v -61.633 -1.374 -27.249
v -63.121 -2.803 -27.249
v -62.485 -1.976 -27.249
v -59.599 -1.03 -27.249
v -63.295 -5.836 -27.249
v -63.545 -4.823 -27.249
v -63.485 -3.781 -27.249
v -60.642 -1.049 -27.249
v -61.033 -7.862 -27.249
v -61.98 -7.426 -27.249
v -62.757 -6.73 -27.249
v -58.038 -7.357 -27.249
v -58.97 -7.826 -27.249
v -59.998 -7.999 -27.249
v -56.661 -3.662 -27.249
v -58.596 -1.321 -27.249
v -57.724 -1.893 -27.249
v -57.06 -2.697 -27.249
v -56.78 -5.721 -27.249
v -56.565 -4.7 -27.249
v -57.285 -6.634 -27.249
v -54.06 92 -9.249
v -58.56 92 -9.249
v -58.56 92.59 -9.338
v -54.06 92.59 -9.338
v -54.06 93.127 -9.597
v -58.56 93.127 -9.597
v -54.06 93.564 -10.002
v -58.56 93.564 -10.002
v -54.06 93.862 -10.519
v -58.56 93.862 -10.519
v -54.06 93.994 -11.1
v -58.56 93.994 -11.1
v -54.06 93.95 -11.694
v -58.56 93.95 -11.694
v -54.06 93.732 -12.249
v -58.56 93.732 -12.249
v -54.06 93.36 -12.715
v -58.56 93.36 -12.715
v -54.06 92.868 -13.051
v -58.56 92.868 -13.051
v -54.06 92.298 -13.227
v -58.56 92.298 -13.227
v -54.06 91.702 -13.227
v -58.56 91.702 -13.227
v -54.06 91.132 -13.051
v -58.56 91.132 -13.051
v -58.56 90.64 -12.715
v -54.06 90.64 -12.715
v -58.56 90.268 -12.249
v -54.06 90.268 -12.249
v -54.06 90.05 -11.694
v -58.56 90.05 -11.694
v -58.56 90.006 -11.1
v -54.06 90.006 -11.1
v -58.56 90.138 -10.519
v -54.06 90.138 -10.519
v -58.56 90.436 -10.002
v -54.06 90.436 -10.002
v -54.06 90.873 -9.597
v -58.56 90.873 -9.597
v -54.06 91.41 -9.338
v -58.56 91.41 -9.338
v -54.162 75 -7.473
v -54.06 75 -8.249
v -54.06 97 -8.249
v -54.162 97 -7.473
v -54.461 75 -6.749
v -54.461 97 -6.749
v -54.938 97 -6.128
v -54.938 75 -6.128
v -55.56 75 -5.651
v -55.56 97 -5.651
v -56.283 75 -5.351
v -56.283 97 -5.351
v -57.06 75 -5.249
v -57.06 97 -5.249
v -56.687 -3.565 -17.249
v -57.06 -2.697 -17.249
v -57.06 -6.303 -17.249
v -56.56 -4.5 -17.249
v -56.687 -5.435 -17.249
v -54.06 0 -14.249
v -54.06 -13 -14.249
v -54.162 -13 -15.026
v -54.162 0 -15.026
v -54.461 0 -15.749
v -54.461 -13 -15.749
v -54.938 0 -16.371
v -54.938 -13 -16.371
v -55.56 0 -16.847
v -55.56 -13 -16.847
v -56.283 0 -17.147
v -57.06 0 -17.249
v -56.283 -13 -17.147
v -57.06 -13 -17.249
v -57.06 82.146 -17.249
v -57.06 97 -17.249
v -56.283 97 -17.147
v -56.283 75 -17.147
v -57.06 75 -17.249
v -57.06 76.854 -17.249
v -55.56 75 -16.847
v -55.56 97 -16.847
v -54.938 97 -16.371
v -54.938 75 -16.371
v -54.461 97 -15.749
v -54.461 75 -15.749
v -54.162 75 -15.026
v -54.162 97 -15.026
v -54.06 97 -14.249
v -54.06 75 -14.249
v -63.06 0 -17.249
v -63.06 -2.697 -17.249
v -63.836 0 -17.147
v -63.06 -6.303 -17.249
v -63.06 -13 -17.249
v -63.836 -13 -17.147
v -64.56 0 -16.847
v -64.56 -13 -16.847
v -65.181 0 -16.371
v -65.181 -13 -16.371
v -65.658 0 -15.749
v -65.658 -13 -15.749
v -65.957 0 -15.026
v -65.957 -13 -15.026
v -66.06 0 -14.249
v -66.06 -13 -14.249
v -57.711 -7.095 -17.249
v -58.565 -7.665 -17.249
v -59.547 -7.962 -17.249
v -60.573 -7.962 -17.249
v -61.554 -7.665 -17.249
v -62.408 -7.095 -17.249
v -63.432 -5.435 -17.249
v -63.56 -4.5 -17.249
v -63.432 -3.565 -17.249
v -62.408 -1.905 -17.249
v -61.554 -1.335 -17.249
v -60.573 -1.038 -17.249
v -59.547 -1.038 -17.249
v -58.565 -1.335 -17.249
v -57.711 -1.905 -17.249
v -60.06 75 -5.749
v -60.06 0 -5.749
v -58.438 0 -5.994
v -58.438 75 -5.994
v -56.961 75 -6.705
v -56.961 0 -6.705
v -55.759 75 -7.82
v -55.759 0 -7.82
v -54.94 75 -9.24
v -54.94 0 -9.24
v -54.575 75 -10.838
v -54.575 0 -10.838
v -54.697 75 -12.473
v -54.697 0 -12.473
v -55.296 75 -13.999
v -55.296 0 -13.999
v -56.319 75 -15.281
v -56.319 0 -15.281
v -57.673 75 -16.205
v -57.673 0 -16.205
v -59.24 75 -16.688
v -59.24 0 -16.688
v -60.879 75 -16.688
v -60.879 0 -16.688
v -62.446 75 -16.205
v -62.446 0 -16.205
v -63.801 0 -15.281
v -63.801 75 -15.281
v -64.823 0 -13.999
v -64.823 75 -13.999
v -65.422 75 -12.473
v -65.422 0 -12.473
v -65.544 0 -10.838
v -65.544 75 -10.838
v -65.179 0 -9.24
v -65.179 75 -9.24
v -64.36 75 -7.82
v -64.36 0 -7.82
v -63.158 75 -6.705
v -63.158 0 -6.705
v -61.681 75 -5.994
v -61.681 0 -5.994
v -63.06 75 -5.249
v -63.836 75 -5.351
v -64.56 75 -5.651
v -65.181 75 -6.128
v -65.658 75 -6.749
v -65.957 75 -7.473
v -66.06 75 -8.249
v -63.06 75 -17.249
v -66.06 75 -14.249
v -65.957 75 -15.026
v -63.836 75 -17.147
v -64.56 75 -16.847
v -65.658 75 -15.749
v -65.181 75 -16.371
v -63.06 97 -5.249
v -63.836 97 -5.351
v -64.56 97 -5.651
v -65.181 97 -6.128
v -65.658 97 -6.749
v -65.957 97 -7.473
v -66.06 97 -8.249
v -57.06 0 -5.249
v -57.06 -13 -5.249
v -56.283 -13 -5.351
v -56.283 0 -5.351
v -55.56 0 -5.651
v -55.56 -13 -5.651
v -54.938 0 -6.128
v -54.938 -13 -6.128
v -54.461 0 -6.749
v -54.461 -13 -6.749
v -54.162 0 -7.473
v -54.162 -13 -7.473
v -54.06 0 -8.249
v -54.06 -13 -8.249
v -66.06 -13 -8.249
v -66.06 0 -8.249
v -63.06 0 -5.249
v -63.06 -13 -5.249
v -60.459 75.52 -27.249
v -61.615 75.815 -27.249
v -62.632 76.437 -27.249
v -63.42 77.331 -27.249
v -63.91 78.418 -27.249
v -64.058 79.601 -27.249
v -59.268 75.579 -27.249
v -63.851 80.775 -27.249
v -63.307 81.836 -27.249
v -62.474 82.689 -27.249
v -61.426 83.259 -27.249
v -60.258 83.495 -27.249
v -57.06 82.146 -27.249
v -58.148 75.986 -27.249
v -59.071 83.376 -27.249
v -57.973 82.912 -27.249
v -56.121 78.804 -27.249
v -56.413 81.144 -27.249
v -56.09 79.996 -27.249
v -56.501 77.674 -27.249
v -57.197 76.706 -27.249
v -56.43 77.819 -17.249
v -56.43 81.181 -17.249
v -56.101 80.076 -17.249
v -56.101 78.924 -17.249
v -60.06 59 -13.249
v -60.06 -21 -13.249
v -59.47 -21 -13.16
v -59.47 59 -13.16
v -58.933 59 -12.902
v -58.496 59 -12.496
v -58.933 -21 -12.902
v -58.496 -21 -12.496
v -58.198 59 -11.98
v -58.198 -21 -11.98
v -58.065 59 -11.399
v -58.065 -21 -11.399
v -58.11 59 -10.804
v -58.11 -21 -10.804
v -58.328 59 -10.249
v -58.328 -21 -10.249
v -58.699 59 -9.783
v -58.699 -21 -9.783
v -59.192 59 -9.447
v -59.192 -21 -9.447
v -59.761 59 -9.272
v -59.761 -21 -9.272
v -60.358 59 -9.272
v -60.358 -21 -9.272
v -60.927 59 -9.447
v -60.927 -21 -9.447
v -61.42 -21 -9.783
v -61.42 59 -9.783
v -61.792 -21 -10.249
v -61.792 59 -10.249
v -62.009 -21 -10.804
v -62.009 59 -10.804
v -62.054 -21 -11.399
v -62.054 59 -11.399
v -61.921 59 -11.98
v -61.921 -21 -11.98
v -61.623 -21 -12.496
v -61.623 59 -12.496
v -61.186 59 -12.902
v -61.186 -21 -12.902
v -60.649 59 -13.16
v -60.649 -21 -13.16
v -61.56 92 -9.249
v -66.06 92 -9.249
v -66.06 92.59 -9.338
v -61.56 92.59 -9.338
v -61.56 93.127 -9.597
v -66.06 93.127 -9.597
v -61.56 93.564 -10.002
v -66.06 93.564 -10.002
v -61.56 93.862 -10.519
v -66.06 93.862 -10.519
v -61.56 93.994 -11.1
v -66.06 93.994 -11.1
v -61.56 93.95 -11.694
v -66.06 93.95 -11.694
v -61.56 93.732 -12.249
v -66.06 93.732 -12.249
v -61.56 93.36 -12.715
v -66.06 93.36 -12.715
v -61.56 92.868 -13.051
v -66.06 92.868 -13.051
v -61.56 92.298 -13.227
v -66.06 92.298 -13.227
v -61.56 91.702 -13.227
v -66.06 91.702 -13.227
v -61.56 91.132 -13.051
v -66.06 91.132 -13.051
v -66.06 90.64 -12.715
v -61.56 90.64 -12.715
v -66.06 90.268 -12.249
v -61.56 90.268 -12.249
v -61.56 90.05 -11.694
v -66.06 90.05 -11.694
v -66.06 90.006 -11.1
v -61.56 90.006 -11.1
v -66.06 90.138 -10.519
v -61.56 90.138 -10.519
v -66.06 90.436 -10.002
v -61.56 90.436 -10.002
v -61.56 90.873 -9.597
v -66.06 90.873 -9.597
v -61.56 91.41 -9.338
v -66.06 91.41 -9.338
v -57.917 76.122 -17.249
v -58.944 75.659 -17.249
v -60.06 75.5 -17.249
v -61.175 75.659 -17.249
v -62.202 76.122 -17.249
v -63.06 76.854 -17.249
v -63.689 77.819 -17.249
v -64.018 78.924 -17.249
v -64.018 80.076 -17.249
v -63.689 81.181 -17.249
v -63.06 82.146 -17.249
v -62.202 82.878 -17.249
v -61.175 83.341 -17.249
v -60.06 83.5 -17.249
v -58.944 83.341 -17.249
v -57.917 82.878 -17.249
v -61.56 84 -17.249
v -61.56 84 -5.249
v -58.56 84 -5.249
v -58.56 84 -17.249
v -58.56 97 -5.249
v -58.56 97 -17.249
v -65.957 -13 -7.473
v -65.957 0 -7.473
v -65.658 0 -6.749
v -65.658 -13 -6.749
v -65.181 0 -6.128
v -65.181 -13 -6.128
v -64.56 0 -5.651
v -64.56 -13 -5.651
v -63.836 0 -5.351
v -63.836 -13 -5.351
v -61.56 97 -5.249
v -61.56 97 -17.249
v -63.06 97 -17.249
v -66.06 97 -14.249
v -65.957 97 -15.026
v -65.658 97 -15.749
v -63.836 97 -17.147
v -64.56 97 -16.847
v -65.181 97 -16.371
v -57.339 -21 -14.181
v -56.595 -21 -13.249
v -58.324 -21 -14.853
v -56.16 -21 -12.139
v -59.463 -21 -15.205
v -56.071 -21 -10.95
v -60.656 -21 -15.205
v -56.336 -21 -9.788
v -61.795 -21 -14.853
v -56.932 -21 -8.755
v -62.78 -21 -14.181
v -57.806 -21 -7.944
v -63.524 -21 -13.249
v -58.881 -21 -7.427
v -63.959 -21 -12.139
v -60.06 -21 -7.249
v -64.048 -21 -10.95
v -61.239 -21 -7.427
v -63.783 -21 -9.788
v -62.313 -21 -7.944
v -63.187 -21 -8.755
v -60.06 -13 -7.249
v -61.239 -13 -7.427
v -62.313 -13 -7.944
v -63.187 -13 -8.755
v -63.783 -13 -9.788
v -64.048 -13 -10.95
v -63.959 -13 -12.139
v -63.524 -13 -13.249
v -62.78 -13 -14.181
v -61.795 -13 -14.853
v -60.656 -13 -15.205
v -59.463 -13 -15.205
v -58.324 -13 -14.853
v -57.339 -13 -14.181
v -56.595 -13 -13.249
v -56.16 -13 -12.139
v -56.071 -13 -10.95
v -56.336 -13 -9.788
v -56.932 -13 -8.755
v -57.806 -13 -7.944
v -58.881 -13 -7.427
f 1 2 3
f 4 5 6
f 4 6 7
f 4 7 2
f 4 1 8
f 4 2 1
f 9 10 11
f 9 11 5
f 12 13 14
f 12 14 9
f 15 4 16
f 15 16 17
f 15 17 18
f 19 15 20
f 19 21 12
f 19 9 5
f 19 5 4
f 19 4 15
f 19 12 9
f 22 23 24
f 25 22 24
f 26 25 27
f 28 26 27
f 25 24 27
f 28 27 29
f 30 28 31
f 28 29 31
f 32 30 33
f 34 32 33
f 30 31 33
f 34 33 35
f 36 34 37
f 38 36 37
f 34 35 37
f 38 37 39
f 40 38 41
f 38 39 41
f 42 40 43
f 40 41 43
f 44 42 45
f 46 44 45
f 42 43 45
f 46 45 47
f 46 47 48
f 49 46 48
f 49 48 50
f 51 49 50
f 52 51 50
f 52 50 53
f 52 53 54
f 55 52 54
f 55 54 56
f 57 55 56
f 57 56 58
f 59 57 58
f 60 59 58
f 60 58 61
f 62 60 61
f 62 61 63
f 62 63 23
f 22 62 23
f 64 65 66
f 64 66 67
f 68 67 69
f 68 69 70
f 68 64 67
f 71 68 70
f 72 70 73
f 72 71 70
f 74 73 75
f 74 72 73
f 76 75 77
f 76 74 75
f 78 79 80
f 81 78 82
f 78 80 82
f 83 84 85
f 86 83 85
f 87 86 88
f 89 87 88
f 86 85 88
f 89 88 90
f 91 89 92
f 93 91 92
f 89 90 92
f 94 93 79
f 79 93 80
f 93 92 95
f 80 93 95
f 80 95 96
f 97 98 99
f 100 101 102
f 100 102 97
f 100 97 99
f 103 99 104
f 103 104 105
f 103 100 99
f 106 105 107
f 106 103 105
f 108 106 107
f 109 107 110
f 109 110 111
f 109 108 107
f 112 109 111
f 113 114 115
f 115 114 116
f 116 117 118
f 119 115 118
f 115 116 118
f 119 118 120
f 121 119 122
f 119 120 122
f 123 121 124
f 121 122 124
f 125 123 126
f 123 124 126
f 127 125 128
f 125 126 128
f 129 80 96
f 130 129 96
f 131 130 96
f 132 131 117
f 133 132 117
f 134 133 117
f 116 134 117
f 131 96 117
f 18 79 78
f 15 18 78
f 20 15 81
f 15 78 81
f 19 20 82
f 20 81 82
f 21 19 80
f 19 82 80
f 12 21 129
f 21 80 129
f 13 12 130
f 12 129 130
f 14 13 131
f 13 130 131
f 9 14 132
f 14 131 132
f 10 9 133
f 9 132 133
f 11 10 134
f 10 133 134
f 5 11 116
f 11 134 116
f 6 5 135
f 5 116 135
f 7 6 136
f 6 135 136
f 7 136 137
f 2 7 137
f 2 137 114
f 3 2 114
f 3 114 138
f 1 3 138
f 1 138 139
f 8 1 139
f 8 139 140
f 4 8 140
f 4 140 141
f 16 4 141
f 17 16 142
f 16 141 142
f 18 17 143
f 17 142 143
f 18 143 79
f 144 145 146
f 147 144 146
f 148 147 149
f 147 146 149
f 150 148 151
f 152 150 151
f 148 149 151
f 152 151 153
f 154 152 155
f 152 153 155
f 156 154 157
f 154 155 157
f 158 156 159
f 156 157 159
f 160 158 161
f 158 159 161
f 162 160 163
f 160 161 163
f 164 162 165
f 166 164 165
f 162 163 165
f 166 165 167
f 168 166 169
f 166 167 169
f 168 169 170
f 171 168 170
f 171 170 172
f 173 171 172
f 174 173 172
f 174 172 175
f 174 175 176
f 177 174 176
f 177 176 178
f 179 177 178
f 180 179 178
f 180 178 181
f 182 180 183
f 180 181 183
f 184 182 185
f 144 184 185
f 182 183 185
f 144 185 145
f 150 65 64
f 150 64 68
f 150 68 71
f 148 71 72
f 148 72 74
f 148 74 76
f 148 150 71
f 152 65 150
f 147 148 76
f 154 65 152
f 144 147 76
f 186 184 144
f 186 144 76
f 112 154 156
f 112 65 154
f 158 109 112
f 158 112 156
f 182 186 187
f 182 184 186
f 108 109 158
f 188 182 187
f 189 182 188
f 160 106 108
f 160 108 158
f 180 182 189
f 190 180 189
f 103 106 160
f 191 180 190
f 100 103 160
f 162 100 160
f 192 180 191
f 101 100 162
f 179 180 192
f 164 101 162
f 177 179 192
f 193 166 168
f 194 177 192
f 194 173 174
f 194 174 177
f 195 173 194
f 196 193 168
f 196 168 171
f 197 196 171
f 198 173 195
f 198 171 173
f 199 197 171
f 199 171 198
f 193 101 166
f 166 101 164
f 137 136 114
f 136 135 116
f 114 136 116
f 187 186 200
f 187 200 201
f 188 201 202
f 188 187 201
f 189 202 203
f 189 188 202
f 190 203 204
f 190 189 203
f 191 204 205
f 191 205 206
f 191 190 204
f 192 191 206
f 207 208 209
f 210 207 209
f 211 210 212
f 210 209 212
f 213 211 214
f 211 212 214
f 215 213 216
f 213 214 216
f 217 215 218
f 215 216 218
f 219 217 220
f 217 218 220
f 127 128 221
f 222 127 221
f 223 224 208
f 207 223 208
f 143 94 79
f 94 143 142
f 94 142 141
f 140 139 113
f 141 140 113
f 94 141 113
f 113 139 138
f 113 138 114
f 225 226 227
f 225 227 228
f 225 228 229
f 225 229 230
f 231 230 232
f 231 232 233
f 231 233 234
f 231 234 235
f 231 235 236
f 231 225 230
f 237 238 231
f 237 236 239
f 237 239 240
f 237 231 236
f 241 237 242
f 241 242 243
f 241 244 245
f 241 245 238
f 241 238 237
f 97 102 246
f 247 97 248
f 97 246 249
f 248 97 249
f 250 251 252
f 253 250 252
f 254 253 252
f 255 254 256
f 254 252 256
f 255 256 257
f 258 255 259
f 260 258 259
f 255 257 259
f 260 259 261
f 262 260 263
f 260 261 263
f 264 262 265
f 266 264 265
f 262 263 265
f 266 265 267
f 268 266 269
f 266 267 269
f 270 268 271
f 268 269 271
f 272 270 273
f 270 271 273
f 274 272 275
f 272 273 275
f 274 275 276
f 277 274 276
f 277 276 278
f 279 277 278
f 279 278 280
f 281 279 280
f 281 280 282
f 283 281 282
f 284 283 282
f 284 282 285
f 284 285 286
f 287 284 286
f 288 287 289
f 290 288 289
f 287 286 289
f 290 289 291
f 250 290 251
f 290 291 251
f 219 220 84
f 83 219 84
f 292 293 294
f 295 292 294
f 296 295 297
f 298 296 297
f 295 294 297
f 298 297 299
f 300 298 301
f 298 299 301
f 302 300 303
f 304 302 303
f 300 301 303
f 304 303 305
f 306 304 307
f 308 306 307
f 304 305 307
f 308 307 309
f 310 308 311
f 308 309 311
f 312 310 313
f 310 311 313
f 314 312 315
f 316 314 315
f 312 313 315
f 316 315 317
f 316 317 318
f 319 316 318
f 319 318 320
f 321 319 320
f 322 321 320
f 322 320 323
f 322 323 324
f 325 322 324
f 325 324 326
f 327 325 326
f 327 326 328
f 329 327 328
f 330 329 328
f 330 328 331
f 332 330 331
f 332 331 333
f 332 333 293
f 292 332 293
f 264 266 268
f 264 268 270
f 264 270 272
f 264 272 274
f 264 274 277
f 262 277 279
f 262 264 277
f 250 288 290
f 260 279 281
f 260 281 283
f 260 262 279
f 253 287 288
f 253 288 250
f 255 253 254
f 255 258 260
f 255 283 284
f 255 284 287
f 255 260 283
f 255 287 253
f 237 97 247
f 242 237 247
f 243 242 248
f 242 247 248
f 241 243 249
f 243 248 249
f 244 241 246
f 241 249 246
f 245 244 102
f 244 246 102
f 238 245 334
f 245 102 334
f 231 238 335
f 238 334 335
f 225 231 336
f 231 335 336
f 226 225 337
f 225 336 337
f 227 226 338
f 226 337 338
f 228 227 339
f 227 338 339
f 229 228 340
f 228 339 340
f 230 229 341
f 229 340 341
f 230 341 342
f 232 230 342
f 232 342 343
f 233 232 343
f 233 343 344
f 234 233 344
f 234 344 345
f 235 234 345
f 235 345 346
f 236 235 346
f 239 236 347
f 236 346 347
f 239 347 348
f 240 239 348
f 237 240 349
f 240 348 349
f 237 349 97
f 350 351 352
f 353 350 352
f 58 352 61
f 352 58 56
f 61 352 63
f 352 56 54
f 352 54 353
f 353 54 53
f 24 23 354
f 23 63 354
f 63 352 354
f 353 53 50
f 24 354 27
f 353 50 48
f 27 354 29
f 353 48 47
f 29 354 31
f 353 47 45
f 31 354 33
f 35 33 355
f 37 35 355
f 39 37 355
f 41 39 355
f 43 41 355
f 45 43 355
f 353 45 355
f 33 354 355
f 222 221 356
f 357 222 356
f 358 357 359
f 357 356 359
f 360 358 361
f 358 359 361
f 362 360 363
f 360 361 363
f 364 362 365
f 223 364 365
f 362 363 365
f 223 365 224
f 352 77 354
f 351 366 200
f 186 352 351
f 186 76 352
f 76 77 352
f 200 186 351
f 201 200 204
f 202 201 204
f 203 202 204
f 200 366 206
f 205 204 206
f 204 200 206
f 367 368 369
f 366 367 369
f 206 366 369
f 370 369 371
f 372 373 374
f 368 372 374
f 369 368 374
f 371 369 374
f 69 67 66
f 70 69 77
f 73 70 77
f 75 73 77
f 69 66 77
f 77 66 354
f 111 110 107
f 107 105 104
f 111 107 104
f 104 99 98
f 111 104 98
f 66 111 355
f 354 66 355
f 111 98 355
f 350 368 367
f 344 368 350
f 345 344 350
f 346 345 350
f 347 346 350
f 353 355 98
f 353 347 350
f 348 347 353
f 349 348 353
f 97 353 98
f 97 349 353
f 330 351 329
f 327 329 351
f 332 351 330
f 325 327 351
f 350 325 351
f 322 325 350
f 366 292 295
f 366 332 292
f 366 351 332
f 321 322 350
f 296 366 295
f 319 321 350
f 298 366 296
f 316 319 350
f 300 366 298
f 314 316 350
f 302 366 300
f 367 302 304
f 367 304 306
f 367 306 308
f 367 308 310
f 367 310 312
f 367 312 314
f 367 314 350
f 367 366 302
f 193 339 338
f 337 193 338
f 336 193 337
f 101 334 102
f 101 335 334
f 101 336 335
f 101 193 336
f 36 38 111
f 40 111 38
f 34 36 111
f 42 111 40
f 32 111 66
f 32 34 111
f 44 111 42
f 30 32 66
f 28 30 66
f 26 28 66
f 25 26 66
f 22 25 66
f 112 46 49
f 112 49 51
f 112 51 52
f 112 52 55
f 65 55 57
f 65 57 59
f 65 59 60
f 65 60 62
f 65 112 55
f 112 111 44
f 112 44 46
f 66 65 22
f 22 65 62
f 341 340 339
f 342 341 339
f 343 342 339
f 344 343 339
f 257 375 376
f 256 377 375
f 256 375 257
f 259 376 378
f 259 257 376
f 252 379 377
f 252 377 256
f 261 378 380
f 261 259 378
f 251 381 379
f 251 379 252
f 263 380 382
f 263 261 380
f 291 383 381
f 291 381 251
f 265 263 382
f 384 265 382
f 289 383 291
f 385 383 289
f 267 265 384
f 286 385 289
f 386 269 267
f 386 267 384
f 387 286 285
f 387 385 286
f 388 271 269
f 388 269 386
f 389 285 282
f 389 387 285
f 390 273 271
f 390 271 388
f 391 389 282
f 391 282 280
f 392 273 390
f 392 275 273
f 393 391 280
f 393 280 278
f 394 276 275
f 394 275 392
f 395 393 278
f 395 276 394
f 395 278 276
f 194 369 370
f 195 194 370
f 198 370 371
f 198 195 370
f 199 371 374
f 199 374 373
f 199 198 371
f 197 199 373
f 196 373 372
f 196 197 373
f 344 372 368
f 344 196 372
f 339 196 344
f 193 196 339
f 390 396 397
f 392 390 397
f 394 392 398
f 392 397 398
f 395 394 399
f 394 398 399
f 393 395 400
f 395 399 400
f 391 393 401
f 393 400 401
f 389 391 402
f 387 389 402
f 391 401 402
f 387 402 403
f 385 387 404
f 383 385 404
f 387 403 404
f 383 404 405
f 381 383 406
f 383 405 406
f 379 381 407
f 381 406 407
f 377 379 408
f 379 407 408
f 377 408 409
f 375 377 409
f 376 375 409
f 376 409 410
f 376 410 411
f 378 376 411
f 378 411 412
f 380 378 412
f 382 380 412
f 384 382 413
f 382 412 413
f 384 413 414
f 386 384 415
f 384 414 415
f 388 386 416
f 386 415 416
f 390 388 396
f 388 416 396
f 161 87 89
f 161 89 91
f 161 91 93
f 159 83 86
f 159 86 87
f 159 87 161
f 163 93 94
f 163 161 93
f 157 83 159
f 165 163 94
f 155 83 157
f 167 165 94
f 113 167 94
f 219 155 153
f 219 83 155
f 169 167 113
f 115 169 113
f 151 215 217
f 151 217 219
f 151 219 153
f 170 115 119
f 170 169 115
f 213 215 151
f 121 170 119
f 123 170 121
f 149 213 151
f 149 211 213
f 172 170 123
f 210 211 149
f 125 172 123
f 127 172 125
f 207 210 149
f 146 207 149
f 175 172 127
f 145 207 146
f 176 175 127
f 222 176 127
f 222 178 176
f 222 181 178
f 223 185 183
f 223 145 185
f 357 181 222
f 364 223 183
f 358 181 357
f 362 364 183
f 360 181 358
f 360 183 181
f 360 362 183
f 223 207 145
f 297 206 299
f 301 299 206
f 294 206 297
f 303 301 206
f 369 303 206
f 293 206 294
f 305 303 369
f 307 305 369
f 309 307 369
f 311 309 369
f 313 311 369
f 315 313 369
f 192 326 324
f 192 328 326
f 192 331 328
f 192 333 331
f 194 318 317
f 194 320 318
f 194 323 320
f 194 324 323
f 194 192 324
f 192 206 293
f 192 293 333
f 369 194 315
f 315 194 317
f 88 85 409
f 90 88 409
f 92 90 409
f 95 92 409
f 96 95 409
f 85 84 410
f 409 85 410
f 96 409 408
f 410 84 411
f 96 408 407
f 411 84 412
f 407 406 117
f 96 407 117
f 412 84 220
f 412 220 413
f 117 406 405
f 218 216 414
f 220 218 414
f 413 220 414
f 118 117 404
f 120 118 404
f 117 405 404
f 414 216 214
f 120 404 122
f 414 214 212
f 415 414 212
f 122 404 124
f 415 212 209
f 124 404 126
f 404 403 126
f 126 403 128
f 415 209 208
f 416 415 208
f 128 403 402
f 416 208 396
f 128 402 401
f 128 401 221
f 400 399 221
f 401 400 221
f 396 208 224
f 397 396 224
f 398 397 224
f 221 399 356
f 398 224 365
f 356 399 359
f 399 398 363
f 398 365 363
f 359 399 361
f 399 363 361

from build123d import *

# Parameters (mm, degrees)
SKETCH1_R           = 5.5
BOSS_EXTRUDE1_DEPTH = 75
BOSS_EXTRUDE2_DEPTH = 22
SKETCH3_R           = 2
CUT_EXTRUDE1_DEPTH  = 100.249870156
SKETCH4_W           = 3
SKETCH4_H           = 12
CUT_EXTRUDE2_DEPTH  = 13
SKETCH5_R           = 4
BOSS_EXTRUDE3_DEPTH = 10
BOSS_EXTRUDE4_START = 13
BOSS_EXTRUDE4_DEPTH = 13
SKETCH7_R           = 3.5
BOSS_EXTRUDE5_DEPTH = 10
SKETCH9_R           = 4
BOSS_EXTRUDE6_DEPTH = 8
SKETCH10_R          = 2
CUT_EXTRUDE3_DEPTH  = 80


with BuildPart() as part:
    # Sketch1 → Boss-Extrude1 (new body)
    with BuildSketch(Plane(origin=(0, 0, 0), x_dir=(1, 0, 0), z_dir=(0, 1, 0))):
        with Locations(Location((-60.059570612, 11.249252908, 0), (0, 0, 270))):
            Circle(SKETCH1_R)
    extrude(amount=BOSS_EXTRUDE1_DEPTH)

    # Sketch2 → Boss-Extrude2 (add)
    with BuildSketch(Plane(origin=(0, 75, 0), x_dir=(1, 0, 0), z_dir=(0, 1, 0))):
        with BuildLine():
            Line((-63.059570612, 17.249252908), (-57.059570612, 17.249252908))
            ThreePointArc((-57.059570612, 17.249252908), (-54.938250268, 16.370573252), (-54.059570612, 14.249252908))
            Line((-54.059570612, 14.249252908), (-54.059570612, 8.249252908))
            ThreePointArc((-54.059570612, 8.249252908), (-54.938250268, 6.127932565), (-57.059570612, 5.249252908))
            Line((-57.059570612, 5.249252908), (-63.059570612, 5.249252908))
            ThreePointArc((-63.059570612, 5.249252908), (-65.180890956, 6.127932565), (-66.059570612, 8.249252908))
            Line((-66.059570612, 8.249252908), (-66.059570612, 14.249252908))
            ThreePointArc((-66.059570612, 14.249252908), (-65.180890956, 16.370573252), (-63.059570612, 17.249252908))
        make_face()
    extrude(amount=BOSS_EXTRUDE2_DEPTH)

    # Sketch3 → Cut-Extrude1 (cut, through all)
    with BuildSketch(Plane.ZY.offset(66.059570612)):
        with Locations((-11.249252908, 92)):
            Circle(SKETCH3_R)
    extrude(amount=-CUT_EXTRUDE1_DEPTH, mode=Mode.SUBTRACT)

    # Sketch4 → Cut-Extrude2 (cut)
    with BuildSketch(Plane(origin=(0, 97, 0), x_dir=(1, 0, 0), z_dir=(0, 1, 0))):
        with Locations((-60.059570612, 11.249252908)):
            Rectangle(SKETCH4_W, SKETCH4_H)
    extrude(amount=-CUT_EXTRUDE2_DEPTH, mode=Mode.SUBTRACT)

    # Sketch5 → Boss-Extrude3 (add)
    with BuildSketch(Plane(origin=(0, 0, -17.249252908), x_dir=(-1, 0, 0), z_dir=(0, 0, -1))):
        with Locations(Location((60.059570612, 79.5, 0), (0, 0, 138.590377891))):
            Circle(SKETCH5_R)
    extrude(amount=BOSS_EXTRUDE3_DEPTH)

    # Sketch6 → Boss-Extrude4 (add)
    with BuildSketch(Plane.XZ.offset(BOSS_EXTRUDE4_START)):
        with BuildLine():
            Line((-57.059570612, -17.249252908), (-63.059570612, -17.249252908))
            ThreePointArc((-63.059570612, -17.249252908), (-65.180890956, -16.370573252), (-66.059570612, -14.249252908))
            Line((-66.059570612, -14.249252908), (-66.059570612, -8.249252908))
            ThreePointArc((-66.059570612, -8.249252908), (-65.180890956, -6.127932565), (-63.059570612, -5.249252908))
            Line((-63.059570612, -5.249252908), (-57.059570612, -5.249252908))
            ThreePointArc((-57.059570612, -5.249252908), (-54.938250268, -6.127932565), (-54.059570612, -8.249252908))
            Line((-54.059570612, -8.249252908), (-54.059570612, -14.249252908))
            ThreePointArc((-54.059570612, -14.249252908), (-54.938250268, -16.370573252), (-57.059570612, -17.249252908))
        make_face()
    extrude(amount=-BOSS_EXTRUDE4_DEPTH)

    # Sketch7 → Boss-Extrude5 (add)
    with BuildSketch(Plane(origin=(0, 0, -17.249252908), x_dir=(-1, 0, 0), z_dir=(0, 0, -1))):
        with Locations(Location((60.059570612, -4.5, 0), (0, 0, 148.997280866))):
            Circle(SKETCH7_R)
    extrude(amount=BOSS_EXTRUDE5_DEPTH)

    # Sketch9 → Boss-Extrude6 (add)
    with BuildSketch(Plane.XZ.offset(13)):
        with Locations(Location((-60.059570612, -11.249252908, 0), (0, 0, 90))):
            Circle(SKETCH9_R)
    extrude(amount=BOSS_EXTRUDE6_DEPTH)

    # Sketch10 → Cut-Extrude3 (cut)
    with BuildSketch(Plane.XZ.offset(21)):
        with Locations(Location((-60.059570612, -11.249252908, 0), (0, 0, 270))):
            Circle(SKETCH10_R)
    extrude(amount=-CUT_EXTRUDE3_DEPTH, mode=Mode.SUBTRACT)


solid = part.part
